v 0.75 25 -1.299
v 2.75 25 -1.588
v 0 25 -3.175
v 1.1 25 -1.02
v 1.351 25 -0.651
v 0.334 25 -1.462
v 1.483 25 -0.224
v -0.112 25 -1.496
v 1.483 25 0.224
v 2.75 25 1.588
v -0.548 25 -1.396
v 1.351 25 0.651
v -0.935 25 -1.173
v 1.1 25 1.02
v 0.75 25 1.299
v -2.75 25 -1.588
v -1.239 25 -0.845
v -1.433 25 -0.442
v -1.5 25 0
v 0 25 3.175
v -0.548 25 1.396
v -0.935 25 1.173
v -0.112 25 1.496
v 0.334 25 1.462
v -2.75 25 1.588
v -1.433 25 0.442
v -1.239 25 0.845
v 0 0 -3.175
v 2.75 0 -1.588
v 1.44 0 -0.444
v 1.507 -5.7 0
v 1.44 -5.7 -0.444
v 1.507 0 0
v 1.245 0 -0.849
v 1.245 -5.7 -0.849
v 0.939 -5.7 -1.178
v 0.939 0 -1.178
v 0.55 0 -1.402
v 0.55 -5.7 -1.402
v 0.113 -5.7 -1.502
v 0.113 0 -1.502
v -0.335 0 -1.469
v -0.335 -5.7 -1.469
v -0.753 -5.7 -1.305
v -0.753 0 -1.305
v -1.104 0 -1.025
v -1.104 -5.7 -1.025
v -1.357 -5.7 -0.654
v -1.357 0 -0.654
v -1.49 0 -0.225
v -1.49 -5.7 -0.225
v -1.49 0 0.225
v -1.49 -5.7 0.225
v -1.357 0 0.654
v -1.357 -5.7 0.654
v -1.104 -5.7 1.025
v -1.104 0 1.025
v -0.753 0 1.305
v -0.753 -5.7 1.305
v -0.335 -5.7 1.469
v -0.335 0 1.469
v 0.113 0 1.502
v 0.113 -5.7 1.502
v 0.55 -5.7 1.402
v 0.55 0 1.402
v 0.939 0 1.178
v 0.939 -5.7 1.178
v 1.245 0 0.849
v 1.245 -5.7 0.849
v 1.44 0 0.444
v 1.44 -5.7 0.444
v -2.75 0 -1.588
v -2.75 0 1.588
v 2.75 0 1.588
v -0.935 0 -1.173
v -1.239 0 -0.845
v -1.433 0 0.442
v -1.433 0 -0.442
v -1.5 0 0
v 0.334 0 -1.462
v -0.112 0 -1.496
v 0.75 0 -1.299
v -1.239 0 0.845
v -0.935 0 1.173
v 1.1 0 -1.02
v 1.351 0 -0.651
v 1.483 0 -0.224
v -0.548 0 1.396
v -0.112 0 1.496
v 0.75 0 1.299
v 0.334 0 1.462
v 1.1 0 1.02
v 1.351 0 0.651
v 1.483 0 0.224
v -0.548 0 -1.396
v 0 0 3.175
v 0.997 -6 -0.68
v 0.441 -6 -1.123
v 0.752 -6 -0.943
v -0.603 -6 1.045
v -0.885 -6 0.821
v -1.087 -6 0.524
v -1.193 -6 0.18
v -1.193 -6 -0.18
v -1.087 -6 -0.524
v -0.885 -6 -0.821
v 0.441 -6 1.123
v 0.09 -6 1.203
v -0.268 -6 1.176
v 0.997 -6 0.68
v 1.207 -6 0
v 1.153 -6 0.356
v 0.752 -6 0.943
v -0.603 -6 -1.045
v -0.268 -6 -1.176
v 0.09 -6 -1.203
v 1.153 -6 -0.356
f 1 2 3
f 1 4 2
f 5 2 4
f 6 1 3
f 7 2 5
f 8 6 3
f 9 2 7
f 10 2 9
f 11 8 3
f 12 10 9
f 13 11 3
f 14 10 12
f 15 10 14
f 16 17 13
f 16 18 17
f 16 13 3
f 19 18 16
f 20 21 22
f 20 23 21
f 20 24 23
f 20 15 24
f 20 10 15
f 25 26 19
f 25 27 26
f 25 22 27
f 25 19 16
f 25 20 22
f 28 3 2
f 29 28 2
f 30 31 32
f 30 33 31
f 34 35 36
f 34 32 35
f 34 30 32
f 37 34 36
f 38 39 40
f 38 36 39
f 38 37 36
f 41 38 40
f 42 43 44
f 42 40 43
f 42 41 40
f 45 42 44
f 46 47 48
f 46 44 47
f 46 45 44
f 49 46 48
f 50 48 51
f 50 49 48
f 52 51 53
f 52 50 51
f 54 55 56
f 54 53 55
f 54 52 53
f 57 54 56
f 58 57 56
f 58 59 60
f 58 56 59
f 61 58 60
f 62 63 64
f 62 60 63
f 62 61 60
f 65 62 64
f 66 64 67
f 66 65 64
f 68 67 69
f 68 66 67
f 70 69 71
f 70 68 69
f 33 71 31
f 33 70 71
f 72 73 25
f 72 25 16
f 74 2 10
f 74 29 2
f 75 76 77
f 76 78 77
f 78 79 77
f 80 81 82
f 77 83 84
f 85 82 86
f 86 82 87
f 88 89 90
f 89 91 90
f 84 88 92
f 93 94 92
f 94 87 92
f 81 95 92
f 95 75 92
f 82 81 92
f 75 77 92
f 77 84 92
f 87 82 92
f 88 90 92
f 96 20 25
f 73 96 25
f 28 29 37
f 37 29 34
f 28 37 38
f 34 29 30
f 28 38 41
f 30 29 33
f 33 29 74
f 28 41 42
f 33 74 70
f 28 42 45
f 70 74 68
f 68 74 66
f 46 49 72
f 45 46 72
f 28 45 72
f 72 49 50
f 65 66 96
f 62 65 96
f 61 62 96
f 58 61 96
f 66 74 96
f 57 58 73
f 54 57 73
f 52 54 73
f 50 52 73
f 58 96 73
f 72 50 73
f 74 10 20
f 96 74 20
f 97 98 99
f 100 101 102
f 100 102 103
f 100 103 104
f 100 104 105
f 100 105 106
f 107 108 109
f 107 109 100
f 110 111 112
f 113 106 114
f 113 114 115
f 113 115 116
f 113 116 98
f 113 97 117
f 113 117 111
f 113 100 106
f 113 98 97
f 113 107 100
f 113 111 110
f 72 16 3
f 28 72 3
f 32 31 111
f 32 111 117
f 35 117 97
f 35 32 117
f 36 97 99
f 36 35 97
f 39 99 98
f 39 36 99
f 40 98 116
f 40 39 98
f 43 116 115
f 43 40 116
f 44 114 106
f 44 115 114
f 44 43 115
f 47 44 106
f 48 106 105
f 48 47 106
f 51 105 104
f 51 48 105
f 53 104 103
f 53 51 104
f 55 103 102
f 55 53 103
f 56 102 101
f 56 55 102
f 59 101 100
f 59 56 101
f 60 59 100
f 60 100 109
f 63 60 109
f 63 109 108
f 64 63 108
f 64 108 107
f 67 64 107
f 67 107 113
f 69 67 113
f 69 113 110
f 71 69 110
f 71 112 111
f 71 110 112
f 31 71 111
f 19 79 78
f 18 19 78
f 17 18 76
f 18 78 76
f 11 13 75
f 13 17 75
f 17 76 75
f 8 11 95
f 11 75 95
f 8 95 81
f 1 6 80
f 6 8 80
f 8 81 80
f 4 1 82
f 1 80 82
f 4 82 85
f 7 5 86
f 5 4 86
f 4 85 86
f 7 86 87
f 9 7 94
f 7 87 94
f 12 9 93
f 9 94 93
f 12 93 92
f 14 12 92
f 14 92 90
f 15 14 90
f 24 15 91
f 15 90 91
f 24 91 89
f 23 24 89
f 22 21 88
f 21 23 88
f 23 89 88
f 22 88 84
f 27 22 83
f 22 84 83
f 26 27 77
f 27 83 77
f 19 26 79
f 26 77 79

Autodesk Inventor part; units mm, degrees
ref_plane "YZ Plane" through (0, 0, 0) normal (1, 0, 0) x (0, 1, 0)
ref_plane "XZ Plane" through (0, 0, 0) normal (0, 1, 0) x (-1, 0, 0)
ref_plane "XY Plane" through (0, 0, 0) normal (0, 0, 1) x (1, 0, 0)
sketch "Sketch1" plane through (0, 0, 0) normal (0, 1, 0) x (-1, 0, 0)
  circle A0 centre (0, 0) radius 1.5
  line L0 (0, 3.1754) -> (2.75, 1.5877)
  line L1 (2.75, 1.5877) -> (2.75, -1.5877)
  line L2 (2.75, -1.5877) -> (0, -3.1754)
  line L3 (0, -3.1754) -> (-2.75, -1.5877)
  line L4 (-2.75, -1.5877) -> (-2.75, 1.5877)
  line L5 (-2.75, 1.5877) -> (0, 3.1754)
  dimension "d0" = 3
  dimension "d4" = 5.5
extrude "Extrusion1" add sketch "Sketch1" along normal blind 25
thread "Thread2" size "M3x0.5" class "6H" standard "ANSI Metric M Profile" full length
sketch "Sketch3" plane through (0, 0, 0) normal (0, -1, 0) x (1, 0, 0)
  circle A0 centre (0, 0) radius 1.5066
extrude "Extrusion3" add sketch "Sketch3" along normal blind 6
thread "Thread3" size "M3.5x0.6" class "6g" standard "ANSI Metric M Profile" full length
chamfer "Chamfer1" distance 0.3 angle 45 1 edges at (-1.5066, -6, 0)
properties part number "Spacer" material "Nylon 6"
